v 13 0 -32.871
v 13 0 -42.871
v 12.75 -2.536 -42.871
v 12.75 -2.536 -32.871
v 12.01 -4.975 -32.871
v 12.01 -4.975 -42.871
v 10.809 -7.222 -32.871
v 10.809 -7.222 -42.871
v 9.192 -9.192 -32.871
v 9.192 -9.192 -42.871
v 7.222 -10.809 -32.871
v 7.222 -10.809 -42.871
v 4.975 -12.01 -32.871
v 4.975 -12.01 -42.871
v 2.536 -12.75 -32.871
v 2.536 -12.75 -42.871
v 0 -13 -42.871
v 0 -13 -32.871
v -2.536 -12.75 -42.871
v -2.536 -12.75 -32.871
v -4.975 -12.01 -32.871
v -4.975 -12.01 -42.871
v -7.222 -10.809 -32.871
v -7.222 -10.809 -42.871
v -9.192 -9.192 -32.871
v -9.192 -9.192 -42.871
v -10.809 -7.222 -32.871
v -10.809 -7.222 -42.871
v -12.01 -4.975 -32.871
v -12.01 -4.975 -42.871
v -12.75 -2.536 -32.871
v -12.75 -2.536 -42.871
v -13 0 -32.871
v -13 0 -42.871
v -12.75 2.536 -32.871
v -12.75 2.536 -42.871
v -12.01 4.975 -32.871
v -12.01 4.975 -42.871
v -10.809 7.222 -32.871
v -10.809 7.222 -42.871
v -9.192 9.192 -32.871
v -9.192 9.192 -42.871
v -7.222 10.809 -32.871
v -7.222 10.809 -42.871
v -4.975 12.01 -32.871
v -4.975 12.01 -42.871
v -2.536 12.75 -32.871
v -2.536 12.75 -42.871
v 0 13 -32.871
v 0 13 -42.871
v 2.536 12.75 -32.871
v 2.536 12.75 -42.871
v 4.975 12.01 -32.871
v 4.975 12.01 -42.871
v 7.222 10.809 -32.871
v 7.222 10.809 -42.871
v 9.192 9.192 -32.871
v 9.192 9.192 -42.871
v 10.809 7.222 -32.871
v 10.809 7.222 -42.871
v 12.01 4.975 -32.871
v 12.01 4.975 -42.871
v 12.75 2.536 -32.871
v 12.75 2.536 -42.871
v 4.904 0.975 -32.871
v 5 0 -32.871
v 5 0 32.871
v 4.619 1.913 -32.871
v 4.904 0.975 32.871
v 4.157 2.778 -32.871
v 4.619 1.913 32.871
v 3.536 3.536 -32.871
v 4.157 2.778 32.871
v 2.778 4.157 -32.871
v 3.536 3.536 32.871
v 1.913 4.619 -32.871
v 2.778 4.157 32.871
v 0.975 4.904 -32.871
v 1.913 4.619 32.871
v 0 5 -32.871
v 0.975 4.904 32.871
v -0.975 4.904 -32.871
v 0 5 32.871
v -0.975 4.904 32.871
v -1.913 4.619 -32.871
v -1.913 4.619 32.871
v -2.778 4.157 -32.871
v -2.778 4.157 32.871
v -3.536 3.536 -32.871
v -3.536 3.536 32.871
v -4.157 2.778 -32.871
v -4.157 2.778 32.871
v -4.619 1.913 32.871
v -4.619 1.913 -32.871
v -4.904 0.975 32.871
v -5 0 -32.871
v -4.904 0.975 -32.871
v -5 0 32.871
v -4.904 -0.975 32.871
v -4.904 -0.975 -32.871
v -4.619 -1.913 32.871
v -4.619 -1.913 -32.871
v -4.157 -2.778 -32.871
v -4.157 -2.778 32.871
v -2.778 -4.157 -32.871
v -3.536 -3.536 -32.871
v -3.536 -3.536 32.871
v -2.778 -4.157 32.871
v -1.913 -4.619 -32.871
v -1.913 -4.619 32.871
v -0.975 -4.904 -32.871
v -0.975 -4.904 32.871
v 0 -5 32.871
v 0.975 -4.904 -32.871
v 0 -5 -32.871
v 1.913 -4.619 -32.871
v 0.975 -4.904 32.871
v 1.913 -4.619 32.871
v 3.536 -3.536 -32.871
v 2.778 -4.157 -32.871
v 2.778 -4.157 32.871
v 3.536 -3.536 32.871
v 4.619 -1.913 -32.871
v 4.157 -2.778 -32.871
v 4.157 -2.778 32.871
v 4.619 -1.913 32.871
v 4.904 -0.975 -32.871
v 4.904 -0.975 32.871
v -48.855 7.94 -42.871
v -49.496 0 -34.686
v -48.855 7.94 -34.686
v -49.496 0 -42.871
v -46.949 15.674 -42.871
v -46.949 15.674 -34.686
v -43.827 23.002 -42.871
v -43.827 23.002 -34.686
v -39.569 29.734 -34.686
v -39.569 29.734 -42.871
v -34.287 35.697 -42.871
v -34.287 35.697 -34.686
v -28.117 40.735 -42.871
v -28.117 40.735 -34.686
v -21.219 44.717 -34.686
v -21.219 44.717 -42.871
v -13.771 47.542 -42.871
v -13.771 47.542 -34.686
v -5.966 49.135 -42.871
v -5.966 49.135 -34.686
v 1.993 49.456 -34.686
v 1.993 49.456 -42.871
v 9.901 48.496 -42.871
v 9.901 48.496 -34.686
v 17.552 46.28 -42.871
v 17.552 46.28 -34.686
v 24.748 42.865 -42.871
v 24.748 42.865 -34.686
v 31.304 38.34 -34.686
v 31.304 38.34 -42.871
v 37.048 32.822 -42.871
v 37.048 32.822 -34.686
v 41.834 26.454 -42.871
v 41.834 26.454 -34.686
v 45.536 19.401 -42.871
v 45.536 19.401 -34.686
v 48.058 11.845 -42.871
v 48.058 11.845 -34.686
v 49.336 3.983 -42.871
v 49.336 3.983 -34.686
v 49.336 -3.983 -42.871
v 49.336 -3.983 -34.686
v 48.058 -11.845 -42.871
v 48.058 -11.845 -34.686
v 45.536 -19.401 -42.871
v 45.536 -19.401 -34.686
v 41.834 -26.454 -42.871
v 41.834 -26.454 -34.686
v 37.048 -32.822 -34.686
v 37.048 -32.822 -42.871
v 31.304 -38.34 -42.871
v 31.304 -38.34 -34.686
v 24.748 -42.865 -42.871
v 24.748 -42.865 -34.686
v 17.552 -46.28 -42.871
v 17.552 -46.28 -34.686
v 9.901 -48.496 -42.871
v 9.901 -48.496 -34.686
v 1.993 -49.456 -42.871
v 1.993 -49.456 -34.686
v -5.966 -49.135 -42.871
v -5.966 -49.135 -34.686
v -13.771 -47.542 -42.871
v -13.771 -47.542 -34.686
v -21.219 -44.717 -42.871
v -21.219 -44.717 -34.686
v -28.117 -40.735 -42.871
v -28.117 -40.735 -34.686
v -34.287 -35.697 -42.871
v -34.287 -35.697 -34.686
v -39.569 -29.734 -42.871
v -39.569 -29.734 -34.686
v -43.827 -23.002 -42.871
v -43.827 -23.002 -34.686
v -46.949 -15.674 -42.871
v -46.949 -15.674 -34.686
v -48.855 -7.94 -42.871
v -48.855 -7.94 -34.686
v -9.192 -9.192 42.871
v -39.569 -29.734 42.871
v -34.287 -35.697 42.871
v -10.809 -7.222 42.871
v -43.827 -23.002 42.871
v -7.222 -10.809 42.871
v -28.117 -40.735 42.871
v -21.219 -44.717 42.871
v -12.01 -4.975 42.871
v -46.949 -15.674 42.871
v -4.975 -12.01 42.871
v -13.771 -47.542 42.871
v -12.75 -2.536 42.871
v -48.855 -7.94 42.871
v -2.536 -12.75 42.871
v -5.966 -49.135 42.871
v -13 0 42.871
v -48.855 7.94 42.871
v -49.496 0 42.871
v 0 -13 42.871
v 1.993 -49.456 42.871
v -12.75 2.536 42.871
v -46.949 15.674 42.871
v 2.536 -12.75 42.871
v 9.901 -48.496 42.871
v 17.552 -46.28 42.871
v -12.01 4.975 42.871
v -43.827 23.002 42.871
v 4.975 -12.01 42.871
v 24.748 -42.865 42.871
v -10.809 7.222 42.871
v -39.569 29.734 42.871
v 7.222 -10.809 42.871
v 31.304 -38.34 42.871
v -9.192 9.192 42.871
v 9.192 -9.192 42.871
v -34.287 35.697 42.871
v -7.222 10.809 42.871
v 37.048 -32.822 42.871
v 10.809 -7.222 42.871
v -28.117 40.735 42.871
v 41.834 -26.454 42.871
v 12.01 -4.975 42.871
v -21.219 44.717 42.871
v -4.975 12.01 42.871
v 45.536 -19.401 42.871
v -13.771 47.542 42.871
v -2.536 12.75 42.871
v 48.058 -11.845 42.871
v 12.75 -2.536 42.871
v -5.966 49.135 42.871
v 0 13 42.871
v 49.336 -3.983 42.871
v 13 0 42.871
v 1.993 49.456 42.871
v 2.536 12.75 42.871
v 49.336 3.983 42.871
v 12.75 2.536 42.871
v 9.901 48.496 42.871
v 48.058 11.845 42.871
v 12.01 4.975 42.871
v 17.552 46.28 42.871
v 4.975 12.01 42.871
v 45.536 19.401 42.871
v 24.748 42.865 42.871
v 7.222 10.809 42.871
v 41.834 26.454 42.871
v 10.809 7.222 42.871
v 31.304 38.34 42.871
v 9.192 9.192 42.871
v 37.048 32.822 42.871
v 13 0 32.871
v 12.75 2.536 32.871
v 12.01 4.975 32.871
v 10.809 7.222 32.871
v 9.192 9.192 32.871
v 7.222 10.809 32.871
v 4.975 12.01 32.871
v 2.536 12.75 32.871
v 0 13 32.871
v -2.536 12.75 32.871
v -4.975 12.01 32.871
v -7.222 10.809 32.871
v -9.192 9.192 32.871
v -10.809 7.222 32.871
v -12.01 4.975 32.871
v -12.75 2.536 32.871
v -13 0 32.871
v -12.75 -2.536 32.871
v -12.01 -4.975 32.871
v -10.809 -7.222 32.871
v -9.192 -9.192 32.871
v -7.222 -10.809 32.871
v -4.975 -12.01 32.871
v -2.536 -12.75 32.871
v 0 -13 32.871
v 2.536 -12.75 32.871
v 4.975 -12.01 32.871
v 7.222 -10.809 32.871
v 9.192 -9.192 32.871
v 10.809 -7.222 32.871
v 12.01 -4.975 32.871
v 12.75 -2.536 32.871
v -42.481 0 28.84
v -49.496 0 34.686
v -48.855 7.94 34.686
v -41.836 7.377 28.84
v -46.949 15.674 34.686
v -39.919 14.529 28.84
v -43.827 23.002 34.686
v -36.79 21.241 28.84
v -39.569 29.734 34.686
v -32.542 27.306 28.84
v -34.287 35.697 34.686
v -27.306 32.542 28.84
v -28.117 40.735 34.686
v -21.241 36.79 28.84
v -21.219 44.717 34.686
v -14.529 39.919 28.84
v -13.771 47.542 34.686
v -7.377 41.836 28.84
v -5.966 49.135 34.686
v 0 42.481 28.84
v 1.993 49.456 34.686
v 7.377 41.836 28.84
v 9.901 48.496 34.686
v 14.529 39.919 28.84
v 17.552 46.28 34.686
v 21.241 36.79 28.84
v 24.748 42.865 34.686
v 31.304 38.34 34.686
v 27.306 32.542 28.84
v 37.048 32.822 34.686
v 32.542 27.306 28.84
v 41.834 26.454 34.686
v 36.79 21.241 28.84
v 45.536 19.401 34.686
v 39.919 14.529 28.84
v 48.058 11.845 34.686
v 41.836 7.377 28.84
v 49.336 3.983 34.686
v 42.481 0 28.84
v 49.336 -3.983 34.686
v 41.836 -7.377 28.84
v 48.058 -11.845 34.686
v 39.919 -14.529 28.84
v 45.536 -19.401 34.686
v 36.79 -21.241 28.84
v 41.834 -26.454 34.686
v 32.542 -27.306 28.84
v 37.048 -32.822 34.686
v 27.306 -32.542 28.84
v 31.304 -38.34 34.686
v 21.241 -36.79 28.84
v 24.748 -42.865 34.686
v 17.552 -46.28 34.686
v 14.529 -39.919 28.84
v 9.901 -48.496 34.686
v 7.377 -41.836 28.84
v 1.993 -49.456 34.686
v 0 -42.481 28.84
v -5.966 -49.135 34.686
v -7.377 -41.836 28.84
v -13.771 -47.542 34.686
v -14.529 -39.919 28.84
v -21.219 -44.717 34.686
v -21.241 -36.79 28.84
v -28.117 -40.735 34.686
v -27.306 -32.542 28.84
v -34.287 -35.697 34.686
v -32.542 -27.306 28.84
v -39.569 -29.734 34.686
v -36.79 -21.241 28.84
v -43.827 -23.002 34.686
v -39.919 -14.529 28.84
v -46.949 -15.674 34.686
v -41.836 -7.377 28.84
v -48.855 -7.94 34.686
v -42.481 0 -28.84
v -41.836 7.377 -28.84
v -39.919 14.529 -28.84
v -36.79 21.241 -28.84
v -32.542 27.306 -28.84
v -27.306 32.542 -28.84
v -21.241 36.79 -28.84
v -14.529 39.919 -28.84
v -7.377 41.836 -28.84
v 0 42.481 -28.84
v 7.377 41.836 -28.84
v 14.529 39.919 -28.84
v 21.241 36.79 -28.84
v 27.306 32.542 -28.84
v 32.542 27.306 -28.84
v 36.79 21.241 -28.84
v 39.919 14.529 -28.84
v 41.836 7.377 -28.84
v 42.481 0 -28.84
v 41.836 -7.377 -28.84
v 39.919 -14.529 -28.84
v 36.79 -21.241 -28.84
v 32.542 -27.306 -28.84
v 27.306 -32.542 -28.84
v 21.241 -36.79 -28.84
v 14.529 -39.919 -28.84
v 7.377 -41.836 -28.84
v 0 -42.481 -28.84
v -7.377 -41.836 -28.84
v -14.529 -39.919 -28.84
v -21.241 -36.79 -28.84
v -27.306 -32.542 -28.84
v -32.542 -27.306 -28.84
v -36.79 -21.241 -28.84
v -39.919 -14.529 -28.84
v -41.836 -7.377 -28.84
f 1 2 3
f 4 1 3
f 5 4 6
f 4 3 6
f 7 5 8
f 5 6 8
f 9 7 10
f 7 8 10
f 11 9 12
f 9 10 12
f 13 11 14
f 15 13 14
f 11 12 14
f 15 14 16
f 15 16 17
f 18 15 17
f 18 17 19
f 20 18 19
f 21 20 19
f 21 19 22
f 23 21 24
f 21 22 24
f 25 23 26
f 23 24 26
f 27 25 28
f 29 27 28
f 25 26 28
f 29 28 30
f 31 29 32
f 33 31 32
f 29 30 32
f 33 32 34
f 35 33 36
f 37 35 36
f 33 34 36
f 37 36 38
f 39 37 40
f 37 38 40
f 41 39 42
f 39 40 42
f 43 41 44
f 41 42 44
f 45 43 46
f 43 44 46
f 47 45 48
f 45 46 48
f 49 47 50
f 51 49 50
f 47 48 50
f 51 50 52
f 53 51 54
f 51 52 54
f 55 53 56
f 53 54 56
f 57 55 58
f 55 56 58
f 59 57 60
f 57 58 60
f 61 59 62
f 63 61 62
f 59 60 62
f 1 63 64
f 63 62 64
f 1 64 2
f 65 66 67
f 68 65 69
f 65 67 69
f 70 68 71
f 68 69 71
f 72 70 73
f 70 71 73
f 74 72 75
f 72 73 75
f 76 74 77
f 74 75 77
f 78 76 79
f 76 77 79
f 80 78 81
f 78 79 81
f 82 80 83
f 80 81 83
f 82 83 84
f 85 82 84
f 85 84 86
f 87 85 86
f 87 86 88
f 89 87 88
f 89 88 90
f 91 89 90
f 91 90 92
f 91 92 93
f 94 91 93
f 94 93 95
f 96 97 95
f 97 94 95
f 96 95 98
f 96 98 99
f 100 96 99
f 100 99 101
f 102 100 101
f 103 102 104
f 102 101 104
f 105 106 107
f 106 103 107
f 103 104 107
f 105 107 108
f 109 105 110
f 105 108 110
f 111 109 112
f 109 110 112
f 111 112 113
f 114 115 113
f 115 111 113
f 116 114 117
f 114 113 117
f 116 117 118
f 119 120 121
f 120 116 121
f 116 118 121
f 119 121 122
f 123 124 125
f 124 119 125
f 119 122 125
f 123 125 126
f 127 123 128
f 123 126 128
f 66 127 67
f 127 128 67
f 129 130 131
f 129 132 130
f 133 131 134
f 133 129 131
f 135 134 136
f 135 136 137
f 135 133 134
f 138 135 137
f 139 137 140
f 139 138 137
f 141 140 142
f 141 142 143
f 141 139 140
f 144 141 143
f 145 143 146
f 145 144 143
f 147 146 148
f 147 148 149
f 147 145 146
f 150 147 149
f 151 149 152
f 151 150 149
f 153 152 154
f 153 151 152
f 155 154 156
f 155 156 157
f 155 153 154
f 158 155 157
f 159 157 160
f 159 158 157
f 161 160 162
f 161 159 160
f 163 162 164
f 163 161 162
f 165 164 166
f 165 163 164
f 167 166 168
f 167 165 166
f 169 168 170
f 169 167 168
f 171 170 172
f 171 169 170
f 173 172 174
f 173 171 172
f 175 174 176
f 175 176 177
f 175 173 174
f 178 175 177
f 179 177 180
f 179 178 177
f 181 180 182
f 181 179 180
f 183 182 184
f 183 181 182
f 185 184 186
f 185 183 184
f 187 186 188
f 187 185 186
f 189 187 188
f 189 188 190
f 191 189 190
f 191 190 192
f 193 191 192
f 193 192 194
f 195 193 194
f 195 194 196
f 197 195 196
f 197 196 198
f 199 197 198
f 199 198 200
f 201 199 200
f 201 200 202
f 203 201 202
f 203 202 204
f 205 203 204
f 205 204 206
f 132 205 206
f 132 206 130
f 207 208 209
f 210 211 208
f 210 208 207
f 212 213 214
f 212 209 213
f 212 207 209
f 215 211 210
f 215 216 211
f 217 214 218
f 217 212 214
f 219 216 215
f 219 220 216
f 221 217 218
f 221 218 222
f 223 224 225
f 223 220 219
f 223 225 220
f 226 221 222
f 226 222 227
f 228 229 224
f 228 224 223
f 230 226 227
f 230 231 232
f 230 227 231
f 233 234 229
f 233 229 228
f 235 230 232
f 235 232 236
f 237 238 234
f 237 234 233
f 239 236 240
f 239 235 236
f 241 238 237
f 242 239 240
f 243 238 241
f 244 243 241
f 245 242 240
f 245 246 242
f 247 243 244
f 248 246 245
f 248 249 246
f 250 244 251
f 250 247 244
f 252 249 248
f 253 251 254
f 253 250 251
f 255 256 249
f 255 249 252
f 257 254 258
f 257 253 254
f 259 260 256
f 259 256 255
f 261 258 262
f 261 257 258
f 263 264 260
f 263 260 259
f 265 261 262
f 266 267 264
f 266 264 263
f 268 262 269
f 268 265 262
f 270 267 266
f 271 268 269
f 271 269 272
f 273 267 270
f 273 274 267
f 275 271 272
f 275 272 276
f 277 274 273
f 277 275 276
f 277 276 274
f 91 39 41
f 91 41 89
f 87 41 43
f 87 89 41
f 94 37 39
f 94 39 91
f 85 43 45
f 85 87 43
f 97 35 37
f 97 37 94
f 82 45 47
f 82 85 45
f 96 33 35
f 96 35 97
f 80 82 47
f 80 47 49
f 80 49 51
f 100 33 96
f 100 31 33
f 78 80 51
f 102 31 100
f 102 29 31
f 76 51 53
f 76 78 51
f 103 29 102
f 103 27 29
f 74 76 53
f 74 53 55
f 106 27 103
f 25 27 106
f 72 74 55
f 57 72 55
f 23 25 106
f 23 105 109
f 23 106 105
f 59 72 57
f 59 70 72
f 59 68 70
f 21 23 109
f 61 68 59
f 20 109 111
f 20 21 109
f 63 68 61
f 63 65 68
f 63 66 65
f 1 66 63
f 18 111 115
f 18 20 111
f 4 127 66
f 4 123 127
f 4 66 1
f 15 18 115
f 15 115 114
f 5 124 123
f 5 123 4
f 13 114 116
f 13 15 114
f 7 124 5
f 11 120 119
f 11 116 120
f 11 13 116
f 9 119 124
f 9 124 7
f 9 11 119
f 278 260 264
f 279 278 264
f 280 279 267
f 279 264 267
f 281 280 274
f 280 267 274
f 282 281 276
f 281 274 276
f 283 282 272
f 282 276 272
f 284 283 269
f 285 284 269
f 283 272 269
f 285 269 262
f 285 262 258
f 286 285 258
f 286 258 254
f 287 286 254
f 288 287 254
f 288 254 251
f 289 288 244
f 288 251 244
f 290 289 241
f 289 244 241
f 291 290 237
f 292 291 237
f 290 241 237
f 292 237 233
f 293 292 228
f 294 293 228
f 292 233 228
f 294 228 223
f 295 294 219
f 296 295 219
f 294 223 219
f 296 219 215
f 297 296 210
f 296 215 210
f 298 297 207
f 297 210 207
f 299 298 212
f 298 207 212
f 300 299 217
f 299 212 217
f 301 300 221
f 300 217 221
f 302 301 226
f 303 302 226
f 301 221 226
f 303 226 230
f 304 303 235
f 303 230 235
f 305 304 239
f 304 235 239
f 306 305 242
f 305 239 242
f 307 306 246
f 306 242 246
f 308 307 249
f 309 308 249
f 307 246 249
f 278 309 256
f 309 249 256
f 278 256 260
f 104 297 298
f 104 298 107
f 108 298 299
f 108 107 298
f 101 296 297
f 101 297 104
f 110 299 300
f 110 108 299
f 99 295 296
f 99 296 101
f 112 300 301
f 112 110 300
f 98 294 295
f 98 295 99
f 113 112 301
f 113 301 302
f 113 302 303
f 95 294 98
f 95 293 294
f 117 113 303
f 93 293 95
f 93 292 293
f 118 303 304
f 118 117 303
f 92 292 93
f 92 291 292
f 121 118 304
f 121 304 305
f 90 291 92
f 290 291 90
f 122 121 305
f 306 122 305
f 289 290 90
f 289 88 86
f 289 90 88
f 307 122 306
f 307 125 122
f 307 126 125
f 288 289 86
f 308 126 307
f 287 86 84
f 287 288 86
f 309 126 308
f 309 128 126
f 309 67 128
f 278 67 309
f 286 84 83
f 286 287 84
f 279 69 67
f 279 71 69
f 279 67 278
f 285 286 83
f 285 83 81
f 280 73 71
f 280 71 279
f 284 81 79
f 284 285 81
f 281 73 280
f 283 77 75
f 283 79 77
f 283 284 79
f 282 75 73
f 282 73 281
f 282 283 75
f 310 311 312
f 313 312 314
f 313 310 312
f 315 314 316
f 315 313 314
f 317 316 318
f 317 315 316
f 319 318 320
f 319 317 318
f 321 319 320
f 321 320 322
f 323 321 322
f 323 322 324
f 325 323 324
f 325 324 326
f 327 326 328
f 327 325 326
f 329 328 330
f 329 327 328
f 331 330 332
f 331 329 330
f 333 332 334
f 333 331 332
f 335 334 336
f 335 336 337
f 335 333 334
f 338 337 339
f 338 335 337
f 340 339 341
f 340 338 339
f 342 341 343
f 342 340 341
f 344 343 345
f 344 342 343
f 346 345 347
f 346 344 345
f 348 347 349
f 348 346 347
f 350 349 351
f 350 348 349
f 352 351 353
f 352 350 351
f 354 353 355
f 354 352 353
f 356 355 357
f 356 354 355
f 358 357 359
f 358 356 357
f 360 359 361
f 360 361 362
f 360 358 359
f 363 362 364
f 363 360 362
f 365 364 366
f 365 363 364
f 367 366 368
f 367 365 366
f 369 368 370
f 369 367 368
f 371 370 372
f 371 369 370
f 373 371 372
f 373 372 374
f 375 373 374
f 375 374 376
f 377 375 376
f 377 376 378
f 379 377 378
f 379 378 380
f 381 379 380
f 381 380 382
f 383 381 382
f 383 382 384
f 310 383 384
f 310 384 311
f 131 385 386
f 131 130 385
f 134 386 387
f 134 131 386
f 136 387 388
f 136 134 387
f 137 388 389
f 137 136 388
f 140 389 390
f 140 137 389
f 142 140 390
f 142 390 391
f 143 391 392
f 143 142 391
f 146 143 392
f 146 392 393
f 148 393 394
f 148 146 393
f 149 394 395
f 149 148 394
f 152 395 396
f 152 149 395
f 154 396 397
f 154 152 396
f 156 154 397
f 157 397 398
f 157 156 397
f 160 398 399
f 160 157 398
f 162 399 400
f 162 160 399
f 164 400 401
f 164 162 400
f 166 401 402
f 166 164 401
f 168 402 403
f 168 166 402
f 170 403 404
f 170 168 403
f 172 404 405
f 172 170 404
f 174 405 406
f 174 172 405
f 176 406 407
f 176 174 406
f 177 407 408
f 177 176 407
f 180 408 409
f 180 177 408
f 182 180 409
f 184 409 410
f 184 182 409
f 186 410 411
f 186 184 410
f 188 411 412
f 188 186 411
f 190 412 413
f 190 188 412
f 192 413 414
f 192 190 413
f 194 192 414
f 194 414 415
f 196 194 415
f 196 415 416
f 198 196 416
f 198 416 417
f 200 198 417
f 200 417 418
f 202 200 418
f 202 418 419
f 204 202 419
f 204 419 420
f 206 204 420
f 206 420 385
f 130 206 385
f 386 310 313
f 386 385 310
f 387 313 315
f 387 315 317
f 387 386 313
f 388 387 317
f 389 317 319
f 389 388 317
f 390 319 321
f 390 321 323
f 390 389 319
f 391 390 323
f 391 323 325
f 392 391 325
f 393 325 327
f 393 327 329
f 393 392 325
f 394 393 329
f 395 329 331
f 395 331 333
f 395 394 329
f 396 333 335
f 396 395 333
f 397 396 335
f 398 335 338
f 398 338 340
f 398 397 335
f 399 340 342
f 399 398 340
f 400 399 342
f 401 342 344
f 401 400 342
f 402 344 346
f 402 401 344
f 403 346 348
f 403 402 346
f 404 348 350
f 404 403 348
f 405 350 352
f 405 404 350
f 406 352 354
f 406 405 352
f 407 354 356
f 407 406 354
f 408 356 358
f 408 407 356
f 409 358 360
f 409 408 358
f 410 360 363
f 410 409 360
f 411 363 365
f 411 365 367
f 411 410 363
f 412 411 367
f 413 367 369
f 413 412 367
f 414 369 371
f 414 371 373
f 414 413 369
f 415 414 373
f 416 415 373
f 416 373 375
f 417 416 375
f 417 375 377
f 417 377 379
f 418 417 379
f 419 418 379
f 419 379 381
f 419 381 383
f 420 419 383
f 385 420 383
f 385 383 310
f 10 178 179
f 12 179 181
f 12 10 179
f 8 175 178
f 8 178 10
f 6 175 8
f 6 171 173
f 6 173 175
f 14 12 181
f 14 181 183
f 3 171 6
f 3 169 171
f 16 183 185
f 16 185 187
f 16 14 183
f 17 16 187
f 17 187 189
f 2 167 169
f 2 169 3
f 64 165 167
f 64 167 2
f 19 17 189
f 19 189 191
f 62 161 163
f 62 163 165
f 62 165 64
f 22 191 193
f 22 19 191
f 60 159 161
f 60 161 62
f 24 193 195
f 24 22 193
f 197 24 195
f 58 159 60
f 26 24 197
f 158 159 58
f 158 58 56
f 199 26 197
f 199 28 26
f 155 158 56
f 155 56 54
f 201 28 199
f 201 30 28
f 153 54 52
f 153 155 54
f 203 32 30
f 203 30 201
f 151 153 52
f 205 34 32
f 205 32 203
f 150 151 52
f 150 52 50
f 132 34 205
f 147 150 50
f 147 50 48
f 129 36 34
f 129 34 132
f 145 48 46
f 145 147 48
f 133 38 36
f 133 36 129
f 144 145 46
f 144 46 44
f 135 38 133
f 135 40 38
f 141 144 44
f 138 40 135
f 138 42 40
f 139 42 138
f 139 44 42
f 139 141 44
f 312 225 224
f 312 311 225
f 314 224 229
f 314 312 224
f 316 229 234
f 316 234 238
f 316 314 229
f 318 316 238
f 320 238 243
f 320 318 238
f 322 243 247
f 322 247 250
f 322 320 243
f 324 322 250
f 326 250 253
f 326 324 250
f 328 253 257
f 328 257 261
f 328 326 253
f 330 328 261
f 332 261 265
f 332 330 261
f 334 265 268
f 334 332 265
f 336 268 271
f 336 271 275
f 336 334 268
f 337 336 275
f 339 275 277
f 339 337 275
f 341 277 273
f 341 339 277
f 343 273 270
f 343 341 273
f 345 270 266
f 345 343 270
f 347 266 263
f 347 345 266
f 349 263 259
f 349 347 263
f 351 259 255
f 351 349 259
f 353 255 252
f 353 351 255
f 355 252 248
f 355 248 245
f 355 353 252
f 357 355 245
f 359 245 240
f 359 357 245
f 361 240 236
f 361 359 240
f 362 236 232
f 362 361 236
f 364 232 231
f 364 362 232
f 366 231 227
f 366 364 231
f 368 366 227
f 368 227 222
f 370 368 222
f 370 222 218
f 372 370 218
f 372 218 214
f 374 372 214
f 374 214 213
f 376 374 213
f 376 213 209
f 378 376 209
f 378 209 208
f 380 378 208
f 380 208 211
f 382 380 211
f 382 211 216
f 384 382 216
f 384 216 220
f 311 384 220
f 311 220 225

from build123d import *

# Parameters (mm, degrees)
F2_R     = 5
F3_DEPTH = 1000
F2_R_2   = 13
F4_DEPTH = 10
F5_R     = 13
F5_R_2   = 5
F6_DEPTH = 10


with BuildPart() as f1:
    # F0 (on Front) → F1 (revolve)
    with BuildSketch(Plane.XZ):
        Polygon((0, 0), (0, 42.870745), (-49.496219, 42.870745), (-49.496219, 34.686334), (-42.481005, 28.84032), (-42.481005, 0), (-42.481005, -28.84032), (-49.496219, -34.686334), (-49.496219, -42.870745), (0, -42.870745), align=None)
    revolve(axis=Axis((0, 0, 21.435373), (0, 0, -1)))

    # F2 (on face) → F3 (cut)
    with BuildSketch(Plane.XY.offset(42.870745)):
        Circle(F2_R)
    extrude(amount=-F3_DEPTH, mode=Mode.SUBTRACT)

    # F2 (on face) → F4 (cut)
    with BuildSketch(Plane.XY.offset(42.870745)):
        Circle(F2_R_2)
        Circle(F2_R, mode=Mode.SUBTRACT)
    extrude(amount=-F4_DEPTH, mode=Mode.SUBTRACT)

    # F5 (on face) → F6 (cut)
    with BuildSketch(Plane(origin=(0, 0, -42.870745), x_dir=(1, 0, 0), z_dir=(0, 0, -1))):
        Circle(F5_R)
        Circle(F5_R_2, mode=Mode.SUBTRACT)
    extrude(amount=-F6_DEPTH, mode=Mode.SUBTRACT)


solid = f1.part
